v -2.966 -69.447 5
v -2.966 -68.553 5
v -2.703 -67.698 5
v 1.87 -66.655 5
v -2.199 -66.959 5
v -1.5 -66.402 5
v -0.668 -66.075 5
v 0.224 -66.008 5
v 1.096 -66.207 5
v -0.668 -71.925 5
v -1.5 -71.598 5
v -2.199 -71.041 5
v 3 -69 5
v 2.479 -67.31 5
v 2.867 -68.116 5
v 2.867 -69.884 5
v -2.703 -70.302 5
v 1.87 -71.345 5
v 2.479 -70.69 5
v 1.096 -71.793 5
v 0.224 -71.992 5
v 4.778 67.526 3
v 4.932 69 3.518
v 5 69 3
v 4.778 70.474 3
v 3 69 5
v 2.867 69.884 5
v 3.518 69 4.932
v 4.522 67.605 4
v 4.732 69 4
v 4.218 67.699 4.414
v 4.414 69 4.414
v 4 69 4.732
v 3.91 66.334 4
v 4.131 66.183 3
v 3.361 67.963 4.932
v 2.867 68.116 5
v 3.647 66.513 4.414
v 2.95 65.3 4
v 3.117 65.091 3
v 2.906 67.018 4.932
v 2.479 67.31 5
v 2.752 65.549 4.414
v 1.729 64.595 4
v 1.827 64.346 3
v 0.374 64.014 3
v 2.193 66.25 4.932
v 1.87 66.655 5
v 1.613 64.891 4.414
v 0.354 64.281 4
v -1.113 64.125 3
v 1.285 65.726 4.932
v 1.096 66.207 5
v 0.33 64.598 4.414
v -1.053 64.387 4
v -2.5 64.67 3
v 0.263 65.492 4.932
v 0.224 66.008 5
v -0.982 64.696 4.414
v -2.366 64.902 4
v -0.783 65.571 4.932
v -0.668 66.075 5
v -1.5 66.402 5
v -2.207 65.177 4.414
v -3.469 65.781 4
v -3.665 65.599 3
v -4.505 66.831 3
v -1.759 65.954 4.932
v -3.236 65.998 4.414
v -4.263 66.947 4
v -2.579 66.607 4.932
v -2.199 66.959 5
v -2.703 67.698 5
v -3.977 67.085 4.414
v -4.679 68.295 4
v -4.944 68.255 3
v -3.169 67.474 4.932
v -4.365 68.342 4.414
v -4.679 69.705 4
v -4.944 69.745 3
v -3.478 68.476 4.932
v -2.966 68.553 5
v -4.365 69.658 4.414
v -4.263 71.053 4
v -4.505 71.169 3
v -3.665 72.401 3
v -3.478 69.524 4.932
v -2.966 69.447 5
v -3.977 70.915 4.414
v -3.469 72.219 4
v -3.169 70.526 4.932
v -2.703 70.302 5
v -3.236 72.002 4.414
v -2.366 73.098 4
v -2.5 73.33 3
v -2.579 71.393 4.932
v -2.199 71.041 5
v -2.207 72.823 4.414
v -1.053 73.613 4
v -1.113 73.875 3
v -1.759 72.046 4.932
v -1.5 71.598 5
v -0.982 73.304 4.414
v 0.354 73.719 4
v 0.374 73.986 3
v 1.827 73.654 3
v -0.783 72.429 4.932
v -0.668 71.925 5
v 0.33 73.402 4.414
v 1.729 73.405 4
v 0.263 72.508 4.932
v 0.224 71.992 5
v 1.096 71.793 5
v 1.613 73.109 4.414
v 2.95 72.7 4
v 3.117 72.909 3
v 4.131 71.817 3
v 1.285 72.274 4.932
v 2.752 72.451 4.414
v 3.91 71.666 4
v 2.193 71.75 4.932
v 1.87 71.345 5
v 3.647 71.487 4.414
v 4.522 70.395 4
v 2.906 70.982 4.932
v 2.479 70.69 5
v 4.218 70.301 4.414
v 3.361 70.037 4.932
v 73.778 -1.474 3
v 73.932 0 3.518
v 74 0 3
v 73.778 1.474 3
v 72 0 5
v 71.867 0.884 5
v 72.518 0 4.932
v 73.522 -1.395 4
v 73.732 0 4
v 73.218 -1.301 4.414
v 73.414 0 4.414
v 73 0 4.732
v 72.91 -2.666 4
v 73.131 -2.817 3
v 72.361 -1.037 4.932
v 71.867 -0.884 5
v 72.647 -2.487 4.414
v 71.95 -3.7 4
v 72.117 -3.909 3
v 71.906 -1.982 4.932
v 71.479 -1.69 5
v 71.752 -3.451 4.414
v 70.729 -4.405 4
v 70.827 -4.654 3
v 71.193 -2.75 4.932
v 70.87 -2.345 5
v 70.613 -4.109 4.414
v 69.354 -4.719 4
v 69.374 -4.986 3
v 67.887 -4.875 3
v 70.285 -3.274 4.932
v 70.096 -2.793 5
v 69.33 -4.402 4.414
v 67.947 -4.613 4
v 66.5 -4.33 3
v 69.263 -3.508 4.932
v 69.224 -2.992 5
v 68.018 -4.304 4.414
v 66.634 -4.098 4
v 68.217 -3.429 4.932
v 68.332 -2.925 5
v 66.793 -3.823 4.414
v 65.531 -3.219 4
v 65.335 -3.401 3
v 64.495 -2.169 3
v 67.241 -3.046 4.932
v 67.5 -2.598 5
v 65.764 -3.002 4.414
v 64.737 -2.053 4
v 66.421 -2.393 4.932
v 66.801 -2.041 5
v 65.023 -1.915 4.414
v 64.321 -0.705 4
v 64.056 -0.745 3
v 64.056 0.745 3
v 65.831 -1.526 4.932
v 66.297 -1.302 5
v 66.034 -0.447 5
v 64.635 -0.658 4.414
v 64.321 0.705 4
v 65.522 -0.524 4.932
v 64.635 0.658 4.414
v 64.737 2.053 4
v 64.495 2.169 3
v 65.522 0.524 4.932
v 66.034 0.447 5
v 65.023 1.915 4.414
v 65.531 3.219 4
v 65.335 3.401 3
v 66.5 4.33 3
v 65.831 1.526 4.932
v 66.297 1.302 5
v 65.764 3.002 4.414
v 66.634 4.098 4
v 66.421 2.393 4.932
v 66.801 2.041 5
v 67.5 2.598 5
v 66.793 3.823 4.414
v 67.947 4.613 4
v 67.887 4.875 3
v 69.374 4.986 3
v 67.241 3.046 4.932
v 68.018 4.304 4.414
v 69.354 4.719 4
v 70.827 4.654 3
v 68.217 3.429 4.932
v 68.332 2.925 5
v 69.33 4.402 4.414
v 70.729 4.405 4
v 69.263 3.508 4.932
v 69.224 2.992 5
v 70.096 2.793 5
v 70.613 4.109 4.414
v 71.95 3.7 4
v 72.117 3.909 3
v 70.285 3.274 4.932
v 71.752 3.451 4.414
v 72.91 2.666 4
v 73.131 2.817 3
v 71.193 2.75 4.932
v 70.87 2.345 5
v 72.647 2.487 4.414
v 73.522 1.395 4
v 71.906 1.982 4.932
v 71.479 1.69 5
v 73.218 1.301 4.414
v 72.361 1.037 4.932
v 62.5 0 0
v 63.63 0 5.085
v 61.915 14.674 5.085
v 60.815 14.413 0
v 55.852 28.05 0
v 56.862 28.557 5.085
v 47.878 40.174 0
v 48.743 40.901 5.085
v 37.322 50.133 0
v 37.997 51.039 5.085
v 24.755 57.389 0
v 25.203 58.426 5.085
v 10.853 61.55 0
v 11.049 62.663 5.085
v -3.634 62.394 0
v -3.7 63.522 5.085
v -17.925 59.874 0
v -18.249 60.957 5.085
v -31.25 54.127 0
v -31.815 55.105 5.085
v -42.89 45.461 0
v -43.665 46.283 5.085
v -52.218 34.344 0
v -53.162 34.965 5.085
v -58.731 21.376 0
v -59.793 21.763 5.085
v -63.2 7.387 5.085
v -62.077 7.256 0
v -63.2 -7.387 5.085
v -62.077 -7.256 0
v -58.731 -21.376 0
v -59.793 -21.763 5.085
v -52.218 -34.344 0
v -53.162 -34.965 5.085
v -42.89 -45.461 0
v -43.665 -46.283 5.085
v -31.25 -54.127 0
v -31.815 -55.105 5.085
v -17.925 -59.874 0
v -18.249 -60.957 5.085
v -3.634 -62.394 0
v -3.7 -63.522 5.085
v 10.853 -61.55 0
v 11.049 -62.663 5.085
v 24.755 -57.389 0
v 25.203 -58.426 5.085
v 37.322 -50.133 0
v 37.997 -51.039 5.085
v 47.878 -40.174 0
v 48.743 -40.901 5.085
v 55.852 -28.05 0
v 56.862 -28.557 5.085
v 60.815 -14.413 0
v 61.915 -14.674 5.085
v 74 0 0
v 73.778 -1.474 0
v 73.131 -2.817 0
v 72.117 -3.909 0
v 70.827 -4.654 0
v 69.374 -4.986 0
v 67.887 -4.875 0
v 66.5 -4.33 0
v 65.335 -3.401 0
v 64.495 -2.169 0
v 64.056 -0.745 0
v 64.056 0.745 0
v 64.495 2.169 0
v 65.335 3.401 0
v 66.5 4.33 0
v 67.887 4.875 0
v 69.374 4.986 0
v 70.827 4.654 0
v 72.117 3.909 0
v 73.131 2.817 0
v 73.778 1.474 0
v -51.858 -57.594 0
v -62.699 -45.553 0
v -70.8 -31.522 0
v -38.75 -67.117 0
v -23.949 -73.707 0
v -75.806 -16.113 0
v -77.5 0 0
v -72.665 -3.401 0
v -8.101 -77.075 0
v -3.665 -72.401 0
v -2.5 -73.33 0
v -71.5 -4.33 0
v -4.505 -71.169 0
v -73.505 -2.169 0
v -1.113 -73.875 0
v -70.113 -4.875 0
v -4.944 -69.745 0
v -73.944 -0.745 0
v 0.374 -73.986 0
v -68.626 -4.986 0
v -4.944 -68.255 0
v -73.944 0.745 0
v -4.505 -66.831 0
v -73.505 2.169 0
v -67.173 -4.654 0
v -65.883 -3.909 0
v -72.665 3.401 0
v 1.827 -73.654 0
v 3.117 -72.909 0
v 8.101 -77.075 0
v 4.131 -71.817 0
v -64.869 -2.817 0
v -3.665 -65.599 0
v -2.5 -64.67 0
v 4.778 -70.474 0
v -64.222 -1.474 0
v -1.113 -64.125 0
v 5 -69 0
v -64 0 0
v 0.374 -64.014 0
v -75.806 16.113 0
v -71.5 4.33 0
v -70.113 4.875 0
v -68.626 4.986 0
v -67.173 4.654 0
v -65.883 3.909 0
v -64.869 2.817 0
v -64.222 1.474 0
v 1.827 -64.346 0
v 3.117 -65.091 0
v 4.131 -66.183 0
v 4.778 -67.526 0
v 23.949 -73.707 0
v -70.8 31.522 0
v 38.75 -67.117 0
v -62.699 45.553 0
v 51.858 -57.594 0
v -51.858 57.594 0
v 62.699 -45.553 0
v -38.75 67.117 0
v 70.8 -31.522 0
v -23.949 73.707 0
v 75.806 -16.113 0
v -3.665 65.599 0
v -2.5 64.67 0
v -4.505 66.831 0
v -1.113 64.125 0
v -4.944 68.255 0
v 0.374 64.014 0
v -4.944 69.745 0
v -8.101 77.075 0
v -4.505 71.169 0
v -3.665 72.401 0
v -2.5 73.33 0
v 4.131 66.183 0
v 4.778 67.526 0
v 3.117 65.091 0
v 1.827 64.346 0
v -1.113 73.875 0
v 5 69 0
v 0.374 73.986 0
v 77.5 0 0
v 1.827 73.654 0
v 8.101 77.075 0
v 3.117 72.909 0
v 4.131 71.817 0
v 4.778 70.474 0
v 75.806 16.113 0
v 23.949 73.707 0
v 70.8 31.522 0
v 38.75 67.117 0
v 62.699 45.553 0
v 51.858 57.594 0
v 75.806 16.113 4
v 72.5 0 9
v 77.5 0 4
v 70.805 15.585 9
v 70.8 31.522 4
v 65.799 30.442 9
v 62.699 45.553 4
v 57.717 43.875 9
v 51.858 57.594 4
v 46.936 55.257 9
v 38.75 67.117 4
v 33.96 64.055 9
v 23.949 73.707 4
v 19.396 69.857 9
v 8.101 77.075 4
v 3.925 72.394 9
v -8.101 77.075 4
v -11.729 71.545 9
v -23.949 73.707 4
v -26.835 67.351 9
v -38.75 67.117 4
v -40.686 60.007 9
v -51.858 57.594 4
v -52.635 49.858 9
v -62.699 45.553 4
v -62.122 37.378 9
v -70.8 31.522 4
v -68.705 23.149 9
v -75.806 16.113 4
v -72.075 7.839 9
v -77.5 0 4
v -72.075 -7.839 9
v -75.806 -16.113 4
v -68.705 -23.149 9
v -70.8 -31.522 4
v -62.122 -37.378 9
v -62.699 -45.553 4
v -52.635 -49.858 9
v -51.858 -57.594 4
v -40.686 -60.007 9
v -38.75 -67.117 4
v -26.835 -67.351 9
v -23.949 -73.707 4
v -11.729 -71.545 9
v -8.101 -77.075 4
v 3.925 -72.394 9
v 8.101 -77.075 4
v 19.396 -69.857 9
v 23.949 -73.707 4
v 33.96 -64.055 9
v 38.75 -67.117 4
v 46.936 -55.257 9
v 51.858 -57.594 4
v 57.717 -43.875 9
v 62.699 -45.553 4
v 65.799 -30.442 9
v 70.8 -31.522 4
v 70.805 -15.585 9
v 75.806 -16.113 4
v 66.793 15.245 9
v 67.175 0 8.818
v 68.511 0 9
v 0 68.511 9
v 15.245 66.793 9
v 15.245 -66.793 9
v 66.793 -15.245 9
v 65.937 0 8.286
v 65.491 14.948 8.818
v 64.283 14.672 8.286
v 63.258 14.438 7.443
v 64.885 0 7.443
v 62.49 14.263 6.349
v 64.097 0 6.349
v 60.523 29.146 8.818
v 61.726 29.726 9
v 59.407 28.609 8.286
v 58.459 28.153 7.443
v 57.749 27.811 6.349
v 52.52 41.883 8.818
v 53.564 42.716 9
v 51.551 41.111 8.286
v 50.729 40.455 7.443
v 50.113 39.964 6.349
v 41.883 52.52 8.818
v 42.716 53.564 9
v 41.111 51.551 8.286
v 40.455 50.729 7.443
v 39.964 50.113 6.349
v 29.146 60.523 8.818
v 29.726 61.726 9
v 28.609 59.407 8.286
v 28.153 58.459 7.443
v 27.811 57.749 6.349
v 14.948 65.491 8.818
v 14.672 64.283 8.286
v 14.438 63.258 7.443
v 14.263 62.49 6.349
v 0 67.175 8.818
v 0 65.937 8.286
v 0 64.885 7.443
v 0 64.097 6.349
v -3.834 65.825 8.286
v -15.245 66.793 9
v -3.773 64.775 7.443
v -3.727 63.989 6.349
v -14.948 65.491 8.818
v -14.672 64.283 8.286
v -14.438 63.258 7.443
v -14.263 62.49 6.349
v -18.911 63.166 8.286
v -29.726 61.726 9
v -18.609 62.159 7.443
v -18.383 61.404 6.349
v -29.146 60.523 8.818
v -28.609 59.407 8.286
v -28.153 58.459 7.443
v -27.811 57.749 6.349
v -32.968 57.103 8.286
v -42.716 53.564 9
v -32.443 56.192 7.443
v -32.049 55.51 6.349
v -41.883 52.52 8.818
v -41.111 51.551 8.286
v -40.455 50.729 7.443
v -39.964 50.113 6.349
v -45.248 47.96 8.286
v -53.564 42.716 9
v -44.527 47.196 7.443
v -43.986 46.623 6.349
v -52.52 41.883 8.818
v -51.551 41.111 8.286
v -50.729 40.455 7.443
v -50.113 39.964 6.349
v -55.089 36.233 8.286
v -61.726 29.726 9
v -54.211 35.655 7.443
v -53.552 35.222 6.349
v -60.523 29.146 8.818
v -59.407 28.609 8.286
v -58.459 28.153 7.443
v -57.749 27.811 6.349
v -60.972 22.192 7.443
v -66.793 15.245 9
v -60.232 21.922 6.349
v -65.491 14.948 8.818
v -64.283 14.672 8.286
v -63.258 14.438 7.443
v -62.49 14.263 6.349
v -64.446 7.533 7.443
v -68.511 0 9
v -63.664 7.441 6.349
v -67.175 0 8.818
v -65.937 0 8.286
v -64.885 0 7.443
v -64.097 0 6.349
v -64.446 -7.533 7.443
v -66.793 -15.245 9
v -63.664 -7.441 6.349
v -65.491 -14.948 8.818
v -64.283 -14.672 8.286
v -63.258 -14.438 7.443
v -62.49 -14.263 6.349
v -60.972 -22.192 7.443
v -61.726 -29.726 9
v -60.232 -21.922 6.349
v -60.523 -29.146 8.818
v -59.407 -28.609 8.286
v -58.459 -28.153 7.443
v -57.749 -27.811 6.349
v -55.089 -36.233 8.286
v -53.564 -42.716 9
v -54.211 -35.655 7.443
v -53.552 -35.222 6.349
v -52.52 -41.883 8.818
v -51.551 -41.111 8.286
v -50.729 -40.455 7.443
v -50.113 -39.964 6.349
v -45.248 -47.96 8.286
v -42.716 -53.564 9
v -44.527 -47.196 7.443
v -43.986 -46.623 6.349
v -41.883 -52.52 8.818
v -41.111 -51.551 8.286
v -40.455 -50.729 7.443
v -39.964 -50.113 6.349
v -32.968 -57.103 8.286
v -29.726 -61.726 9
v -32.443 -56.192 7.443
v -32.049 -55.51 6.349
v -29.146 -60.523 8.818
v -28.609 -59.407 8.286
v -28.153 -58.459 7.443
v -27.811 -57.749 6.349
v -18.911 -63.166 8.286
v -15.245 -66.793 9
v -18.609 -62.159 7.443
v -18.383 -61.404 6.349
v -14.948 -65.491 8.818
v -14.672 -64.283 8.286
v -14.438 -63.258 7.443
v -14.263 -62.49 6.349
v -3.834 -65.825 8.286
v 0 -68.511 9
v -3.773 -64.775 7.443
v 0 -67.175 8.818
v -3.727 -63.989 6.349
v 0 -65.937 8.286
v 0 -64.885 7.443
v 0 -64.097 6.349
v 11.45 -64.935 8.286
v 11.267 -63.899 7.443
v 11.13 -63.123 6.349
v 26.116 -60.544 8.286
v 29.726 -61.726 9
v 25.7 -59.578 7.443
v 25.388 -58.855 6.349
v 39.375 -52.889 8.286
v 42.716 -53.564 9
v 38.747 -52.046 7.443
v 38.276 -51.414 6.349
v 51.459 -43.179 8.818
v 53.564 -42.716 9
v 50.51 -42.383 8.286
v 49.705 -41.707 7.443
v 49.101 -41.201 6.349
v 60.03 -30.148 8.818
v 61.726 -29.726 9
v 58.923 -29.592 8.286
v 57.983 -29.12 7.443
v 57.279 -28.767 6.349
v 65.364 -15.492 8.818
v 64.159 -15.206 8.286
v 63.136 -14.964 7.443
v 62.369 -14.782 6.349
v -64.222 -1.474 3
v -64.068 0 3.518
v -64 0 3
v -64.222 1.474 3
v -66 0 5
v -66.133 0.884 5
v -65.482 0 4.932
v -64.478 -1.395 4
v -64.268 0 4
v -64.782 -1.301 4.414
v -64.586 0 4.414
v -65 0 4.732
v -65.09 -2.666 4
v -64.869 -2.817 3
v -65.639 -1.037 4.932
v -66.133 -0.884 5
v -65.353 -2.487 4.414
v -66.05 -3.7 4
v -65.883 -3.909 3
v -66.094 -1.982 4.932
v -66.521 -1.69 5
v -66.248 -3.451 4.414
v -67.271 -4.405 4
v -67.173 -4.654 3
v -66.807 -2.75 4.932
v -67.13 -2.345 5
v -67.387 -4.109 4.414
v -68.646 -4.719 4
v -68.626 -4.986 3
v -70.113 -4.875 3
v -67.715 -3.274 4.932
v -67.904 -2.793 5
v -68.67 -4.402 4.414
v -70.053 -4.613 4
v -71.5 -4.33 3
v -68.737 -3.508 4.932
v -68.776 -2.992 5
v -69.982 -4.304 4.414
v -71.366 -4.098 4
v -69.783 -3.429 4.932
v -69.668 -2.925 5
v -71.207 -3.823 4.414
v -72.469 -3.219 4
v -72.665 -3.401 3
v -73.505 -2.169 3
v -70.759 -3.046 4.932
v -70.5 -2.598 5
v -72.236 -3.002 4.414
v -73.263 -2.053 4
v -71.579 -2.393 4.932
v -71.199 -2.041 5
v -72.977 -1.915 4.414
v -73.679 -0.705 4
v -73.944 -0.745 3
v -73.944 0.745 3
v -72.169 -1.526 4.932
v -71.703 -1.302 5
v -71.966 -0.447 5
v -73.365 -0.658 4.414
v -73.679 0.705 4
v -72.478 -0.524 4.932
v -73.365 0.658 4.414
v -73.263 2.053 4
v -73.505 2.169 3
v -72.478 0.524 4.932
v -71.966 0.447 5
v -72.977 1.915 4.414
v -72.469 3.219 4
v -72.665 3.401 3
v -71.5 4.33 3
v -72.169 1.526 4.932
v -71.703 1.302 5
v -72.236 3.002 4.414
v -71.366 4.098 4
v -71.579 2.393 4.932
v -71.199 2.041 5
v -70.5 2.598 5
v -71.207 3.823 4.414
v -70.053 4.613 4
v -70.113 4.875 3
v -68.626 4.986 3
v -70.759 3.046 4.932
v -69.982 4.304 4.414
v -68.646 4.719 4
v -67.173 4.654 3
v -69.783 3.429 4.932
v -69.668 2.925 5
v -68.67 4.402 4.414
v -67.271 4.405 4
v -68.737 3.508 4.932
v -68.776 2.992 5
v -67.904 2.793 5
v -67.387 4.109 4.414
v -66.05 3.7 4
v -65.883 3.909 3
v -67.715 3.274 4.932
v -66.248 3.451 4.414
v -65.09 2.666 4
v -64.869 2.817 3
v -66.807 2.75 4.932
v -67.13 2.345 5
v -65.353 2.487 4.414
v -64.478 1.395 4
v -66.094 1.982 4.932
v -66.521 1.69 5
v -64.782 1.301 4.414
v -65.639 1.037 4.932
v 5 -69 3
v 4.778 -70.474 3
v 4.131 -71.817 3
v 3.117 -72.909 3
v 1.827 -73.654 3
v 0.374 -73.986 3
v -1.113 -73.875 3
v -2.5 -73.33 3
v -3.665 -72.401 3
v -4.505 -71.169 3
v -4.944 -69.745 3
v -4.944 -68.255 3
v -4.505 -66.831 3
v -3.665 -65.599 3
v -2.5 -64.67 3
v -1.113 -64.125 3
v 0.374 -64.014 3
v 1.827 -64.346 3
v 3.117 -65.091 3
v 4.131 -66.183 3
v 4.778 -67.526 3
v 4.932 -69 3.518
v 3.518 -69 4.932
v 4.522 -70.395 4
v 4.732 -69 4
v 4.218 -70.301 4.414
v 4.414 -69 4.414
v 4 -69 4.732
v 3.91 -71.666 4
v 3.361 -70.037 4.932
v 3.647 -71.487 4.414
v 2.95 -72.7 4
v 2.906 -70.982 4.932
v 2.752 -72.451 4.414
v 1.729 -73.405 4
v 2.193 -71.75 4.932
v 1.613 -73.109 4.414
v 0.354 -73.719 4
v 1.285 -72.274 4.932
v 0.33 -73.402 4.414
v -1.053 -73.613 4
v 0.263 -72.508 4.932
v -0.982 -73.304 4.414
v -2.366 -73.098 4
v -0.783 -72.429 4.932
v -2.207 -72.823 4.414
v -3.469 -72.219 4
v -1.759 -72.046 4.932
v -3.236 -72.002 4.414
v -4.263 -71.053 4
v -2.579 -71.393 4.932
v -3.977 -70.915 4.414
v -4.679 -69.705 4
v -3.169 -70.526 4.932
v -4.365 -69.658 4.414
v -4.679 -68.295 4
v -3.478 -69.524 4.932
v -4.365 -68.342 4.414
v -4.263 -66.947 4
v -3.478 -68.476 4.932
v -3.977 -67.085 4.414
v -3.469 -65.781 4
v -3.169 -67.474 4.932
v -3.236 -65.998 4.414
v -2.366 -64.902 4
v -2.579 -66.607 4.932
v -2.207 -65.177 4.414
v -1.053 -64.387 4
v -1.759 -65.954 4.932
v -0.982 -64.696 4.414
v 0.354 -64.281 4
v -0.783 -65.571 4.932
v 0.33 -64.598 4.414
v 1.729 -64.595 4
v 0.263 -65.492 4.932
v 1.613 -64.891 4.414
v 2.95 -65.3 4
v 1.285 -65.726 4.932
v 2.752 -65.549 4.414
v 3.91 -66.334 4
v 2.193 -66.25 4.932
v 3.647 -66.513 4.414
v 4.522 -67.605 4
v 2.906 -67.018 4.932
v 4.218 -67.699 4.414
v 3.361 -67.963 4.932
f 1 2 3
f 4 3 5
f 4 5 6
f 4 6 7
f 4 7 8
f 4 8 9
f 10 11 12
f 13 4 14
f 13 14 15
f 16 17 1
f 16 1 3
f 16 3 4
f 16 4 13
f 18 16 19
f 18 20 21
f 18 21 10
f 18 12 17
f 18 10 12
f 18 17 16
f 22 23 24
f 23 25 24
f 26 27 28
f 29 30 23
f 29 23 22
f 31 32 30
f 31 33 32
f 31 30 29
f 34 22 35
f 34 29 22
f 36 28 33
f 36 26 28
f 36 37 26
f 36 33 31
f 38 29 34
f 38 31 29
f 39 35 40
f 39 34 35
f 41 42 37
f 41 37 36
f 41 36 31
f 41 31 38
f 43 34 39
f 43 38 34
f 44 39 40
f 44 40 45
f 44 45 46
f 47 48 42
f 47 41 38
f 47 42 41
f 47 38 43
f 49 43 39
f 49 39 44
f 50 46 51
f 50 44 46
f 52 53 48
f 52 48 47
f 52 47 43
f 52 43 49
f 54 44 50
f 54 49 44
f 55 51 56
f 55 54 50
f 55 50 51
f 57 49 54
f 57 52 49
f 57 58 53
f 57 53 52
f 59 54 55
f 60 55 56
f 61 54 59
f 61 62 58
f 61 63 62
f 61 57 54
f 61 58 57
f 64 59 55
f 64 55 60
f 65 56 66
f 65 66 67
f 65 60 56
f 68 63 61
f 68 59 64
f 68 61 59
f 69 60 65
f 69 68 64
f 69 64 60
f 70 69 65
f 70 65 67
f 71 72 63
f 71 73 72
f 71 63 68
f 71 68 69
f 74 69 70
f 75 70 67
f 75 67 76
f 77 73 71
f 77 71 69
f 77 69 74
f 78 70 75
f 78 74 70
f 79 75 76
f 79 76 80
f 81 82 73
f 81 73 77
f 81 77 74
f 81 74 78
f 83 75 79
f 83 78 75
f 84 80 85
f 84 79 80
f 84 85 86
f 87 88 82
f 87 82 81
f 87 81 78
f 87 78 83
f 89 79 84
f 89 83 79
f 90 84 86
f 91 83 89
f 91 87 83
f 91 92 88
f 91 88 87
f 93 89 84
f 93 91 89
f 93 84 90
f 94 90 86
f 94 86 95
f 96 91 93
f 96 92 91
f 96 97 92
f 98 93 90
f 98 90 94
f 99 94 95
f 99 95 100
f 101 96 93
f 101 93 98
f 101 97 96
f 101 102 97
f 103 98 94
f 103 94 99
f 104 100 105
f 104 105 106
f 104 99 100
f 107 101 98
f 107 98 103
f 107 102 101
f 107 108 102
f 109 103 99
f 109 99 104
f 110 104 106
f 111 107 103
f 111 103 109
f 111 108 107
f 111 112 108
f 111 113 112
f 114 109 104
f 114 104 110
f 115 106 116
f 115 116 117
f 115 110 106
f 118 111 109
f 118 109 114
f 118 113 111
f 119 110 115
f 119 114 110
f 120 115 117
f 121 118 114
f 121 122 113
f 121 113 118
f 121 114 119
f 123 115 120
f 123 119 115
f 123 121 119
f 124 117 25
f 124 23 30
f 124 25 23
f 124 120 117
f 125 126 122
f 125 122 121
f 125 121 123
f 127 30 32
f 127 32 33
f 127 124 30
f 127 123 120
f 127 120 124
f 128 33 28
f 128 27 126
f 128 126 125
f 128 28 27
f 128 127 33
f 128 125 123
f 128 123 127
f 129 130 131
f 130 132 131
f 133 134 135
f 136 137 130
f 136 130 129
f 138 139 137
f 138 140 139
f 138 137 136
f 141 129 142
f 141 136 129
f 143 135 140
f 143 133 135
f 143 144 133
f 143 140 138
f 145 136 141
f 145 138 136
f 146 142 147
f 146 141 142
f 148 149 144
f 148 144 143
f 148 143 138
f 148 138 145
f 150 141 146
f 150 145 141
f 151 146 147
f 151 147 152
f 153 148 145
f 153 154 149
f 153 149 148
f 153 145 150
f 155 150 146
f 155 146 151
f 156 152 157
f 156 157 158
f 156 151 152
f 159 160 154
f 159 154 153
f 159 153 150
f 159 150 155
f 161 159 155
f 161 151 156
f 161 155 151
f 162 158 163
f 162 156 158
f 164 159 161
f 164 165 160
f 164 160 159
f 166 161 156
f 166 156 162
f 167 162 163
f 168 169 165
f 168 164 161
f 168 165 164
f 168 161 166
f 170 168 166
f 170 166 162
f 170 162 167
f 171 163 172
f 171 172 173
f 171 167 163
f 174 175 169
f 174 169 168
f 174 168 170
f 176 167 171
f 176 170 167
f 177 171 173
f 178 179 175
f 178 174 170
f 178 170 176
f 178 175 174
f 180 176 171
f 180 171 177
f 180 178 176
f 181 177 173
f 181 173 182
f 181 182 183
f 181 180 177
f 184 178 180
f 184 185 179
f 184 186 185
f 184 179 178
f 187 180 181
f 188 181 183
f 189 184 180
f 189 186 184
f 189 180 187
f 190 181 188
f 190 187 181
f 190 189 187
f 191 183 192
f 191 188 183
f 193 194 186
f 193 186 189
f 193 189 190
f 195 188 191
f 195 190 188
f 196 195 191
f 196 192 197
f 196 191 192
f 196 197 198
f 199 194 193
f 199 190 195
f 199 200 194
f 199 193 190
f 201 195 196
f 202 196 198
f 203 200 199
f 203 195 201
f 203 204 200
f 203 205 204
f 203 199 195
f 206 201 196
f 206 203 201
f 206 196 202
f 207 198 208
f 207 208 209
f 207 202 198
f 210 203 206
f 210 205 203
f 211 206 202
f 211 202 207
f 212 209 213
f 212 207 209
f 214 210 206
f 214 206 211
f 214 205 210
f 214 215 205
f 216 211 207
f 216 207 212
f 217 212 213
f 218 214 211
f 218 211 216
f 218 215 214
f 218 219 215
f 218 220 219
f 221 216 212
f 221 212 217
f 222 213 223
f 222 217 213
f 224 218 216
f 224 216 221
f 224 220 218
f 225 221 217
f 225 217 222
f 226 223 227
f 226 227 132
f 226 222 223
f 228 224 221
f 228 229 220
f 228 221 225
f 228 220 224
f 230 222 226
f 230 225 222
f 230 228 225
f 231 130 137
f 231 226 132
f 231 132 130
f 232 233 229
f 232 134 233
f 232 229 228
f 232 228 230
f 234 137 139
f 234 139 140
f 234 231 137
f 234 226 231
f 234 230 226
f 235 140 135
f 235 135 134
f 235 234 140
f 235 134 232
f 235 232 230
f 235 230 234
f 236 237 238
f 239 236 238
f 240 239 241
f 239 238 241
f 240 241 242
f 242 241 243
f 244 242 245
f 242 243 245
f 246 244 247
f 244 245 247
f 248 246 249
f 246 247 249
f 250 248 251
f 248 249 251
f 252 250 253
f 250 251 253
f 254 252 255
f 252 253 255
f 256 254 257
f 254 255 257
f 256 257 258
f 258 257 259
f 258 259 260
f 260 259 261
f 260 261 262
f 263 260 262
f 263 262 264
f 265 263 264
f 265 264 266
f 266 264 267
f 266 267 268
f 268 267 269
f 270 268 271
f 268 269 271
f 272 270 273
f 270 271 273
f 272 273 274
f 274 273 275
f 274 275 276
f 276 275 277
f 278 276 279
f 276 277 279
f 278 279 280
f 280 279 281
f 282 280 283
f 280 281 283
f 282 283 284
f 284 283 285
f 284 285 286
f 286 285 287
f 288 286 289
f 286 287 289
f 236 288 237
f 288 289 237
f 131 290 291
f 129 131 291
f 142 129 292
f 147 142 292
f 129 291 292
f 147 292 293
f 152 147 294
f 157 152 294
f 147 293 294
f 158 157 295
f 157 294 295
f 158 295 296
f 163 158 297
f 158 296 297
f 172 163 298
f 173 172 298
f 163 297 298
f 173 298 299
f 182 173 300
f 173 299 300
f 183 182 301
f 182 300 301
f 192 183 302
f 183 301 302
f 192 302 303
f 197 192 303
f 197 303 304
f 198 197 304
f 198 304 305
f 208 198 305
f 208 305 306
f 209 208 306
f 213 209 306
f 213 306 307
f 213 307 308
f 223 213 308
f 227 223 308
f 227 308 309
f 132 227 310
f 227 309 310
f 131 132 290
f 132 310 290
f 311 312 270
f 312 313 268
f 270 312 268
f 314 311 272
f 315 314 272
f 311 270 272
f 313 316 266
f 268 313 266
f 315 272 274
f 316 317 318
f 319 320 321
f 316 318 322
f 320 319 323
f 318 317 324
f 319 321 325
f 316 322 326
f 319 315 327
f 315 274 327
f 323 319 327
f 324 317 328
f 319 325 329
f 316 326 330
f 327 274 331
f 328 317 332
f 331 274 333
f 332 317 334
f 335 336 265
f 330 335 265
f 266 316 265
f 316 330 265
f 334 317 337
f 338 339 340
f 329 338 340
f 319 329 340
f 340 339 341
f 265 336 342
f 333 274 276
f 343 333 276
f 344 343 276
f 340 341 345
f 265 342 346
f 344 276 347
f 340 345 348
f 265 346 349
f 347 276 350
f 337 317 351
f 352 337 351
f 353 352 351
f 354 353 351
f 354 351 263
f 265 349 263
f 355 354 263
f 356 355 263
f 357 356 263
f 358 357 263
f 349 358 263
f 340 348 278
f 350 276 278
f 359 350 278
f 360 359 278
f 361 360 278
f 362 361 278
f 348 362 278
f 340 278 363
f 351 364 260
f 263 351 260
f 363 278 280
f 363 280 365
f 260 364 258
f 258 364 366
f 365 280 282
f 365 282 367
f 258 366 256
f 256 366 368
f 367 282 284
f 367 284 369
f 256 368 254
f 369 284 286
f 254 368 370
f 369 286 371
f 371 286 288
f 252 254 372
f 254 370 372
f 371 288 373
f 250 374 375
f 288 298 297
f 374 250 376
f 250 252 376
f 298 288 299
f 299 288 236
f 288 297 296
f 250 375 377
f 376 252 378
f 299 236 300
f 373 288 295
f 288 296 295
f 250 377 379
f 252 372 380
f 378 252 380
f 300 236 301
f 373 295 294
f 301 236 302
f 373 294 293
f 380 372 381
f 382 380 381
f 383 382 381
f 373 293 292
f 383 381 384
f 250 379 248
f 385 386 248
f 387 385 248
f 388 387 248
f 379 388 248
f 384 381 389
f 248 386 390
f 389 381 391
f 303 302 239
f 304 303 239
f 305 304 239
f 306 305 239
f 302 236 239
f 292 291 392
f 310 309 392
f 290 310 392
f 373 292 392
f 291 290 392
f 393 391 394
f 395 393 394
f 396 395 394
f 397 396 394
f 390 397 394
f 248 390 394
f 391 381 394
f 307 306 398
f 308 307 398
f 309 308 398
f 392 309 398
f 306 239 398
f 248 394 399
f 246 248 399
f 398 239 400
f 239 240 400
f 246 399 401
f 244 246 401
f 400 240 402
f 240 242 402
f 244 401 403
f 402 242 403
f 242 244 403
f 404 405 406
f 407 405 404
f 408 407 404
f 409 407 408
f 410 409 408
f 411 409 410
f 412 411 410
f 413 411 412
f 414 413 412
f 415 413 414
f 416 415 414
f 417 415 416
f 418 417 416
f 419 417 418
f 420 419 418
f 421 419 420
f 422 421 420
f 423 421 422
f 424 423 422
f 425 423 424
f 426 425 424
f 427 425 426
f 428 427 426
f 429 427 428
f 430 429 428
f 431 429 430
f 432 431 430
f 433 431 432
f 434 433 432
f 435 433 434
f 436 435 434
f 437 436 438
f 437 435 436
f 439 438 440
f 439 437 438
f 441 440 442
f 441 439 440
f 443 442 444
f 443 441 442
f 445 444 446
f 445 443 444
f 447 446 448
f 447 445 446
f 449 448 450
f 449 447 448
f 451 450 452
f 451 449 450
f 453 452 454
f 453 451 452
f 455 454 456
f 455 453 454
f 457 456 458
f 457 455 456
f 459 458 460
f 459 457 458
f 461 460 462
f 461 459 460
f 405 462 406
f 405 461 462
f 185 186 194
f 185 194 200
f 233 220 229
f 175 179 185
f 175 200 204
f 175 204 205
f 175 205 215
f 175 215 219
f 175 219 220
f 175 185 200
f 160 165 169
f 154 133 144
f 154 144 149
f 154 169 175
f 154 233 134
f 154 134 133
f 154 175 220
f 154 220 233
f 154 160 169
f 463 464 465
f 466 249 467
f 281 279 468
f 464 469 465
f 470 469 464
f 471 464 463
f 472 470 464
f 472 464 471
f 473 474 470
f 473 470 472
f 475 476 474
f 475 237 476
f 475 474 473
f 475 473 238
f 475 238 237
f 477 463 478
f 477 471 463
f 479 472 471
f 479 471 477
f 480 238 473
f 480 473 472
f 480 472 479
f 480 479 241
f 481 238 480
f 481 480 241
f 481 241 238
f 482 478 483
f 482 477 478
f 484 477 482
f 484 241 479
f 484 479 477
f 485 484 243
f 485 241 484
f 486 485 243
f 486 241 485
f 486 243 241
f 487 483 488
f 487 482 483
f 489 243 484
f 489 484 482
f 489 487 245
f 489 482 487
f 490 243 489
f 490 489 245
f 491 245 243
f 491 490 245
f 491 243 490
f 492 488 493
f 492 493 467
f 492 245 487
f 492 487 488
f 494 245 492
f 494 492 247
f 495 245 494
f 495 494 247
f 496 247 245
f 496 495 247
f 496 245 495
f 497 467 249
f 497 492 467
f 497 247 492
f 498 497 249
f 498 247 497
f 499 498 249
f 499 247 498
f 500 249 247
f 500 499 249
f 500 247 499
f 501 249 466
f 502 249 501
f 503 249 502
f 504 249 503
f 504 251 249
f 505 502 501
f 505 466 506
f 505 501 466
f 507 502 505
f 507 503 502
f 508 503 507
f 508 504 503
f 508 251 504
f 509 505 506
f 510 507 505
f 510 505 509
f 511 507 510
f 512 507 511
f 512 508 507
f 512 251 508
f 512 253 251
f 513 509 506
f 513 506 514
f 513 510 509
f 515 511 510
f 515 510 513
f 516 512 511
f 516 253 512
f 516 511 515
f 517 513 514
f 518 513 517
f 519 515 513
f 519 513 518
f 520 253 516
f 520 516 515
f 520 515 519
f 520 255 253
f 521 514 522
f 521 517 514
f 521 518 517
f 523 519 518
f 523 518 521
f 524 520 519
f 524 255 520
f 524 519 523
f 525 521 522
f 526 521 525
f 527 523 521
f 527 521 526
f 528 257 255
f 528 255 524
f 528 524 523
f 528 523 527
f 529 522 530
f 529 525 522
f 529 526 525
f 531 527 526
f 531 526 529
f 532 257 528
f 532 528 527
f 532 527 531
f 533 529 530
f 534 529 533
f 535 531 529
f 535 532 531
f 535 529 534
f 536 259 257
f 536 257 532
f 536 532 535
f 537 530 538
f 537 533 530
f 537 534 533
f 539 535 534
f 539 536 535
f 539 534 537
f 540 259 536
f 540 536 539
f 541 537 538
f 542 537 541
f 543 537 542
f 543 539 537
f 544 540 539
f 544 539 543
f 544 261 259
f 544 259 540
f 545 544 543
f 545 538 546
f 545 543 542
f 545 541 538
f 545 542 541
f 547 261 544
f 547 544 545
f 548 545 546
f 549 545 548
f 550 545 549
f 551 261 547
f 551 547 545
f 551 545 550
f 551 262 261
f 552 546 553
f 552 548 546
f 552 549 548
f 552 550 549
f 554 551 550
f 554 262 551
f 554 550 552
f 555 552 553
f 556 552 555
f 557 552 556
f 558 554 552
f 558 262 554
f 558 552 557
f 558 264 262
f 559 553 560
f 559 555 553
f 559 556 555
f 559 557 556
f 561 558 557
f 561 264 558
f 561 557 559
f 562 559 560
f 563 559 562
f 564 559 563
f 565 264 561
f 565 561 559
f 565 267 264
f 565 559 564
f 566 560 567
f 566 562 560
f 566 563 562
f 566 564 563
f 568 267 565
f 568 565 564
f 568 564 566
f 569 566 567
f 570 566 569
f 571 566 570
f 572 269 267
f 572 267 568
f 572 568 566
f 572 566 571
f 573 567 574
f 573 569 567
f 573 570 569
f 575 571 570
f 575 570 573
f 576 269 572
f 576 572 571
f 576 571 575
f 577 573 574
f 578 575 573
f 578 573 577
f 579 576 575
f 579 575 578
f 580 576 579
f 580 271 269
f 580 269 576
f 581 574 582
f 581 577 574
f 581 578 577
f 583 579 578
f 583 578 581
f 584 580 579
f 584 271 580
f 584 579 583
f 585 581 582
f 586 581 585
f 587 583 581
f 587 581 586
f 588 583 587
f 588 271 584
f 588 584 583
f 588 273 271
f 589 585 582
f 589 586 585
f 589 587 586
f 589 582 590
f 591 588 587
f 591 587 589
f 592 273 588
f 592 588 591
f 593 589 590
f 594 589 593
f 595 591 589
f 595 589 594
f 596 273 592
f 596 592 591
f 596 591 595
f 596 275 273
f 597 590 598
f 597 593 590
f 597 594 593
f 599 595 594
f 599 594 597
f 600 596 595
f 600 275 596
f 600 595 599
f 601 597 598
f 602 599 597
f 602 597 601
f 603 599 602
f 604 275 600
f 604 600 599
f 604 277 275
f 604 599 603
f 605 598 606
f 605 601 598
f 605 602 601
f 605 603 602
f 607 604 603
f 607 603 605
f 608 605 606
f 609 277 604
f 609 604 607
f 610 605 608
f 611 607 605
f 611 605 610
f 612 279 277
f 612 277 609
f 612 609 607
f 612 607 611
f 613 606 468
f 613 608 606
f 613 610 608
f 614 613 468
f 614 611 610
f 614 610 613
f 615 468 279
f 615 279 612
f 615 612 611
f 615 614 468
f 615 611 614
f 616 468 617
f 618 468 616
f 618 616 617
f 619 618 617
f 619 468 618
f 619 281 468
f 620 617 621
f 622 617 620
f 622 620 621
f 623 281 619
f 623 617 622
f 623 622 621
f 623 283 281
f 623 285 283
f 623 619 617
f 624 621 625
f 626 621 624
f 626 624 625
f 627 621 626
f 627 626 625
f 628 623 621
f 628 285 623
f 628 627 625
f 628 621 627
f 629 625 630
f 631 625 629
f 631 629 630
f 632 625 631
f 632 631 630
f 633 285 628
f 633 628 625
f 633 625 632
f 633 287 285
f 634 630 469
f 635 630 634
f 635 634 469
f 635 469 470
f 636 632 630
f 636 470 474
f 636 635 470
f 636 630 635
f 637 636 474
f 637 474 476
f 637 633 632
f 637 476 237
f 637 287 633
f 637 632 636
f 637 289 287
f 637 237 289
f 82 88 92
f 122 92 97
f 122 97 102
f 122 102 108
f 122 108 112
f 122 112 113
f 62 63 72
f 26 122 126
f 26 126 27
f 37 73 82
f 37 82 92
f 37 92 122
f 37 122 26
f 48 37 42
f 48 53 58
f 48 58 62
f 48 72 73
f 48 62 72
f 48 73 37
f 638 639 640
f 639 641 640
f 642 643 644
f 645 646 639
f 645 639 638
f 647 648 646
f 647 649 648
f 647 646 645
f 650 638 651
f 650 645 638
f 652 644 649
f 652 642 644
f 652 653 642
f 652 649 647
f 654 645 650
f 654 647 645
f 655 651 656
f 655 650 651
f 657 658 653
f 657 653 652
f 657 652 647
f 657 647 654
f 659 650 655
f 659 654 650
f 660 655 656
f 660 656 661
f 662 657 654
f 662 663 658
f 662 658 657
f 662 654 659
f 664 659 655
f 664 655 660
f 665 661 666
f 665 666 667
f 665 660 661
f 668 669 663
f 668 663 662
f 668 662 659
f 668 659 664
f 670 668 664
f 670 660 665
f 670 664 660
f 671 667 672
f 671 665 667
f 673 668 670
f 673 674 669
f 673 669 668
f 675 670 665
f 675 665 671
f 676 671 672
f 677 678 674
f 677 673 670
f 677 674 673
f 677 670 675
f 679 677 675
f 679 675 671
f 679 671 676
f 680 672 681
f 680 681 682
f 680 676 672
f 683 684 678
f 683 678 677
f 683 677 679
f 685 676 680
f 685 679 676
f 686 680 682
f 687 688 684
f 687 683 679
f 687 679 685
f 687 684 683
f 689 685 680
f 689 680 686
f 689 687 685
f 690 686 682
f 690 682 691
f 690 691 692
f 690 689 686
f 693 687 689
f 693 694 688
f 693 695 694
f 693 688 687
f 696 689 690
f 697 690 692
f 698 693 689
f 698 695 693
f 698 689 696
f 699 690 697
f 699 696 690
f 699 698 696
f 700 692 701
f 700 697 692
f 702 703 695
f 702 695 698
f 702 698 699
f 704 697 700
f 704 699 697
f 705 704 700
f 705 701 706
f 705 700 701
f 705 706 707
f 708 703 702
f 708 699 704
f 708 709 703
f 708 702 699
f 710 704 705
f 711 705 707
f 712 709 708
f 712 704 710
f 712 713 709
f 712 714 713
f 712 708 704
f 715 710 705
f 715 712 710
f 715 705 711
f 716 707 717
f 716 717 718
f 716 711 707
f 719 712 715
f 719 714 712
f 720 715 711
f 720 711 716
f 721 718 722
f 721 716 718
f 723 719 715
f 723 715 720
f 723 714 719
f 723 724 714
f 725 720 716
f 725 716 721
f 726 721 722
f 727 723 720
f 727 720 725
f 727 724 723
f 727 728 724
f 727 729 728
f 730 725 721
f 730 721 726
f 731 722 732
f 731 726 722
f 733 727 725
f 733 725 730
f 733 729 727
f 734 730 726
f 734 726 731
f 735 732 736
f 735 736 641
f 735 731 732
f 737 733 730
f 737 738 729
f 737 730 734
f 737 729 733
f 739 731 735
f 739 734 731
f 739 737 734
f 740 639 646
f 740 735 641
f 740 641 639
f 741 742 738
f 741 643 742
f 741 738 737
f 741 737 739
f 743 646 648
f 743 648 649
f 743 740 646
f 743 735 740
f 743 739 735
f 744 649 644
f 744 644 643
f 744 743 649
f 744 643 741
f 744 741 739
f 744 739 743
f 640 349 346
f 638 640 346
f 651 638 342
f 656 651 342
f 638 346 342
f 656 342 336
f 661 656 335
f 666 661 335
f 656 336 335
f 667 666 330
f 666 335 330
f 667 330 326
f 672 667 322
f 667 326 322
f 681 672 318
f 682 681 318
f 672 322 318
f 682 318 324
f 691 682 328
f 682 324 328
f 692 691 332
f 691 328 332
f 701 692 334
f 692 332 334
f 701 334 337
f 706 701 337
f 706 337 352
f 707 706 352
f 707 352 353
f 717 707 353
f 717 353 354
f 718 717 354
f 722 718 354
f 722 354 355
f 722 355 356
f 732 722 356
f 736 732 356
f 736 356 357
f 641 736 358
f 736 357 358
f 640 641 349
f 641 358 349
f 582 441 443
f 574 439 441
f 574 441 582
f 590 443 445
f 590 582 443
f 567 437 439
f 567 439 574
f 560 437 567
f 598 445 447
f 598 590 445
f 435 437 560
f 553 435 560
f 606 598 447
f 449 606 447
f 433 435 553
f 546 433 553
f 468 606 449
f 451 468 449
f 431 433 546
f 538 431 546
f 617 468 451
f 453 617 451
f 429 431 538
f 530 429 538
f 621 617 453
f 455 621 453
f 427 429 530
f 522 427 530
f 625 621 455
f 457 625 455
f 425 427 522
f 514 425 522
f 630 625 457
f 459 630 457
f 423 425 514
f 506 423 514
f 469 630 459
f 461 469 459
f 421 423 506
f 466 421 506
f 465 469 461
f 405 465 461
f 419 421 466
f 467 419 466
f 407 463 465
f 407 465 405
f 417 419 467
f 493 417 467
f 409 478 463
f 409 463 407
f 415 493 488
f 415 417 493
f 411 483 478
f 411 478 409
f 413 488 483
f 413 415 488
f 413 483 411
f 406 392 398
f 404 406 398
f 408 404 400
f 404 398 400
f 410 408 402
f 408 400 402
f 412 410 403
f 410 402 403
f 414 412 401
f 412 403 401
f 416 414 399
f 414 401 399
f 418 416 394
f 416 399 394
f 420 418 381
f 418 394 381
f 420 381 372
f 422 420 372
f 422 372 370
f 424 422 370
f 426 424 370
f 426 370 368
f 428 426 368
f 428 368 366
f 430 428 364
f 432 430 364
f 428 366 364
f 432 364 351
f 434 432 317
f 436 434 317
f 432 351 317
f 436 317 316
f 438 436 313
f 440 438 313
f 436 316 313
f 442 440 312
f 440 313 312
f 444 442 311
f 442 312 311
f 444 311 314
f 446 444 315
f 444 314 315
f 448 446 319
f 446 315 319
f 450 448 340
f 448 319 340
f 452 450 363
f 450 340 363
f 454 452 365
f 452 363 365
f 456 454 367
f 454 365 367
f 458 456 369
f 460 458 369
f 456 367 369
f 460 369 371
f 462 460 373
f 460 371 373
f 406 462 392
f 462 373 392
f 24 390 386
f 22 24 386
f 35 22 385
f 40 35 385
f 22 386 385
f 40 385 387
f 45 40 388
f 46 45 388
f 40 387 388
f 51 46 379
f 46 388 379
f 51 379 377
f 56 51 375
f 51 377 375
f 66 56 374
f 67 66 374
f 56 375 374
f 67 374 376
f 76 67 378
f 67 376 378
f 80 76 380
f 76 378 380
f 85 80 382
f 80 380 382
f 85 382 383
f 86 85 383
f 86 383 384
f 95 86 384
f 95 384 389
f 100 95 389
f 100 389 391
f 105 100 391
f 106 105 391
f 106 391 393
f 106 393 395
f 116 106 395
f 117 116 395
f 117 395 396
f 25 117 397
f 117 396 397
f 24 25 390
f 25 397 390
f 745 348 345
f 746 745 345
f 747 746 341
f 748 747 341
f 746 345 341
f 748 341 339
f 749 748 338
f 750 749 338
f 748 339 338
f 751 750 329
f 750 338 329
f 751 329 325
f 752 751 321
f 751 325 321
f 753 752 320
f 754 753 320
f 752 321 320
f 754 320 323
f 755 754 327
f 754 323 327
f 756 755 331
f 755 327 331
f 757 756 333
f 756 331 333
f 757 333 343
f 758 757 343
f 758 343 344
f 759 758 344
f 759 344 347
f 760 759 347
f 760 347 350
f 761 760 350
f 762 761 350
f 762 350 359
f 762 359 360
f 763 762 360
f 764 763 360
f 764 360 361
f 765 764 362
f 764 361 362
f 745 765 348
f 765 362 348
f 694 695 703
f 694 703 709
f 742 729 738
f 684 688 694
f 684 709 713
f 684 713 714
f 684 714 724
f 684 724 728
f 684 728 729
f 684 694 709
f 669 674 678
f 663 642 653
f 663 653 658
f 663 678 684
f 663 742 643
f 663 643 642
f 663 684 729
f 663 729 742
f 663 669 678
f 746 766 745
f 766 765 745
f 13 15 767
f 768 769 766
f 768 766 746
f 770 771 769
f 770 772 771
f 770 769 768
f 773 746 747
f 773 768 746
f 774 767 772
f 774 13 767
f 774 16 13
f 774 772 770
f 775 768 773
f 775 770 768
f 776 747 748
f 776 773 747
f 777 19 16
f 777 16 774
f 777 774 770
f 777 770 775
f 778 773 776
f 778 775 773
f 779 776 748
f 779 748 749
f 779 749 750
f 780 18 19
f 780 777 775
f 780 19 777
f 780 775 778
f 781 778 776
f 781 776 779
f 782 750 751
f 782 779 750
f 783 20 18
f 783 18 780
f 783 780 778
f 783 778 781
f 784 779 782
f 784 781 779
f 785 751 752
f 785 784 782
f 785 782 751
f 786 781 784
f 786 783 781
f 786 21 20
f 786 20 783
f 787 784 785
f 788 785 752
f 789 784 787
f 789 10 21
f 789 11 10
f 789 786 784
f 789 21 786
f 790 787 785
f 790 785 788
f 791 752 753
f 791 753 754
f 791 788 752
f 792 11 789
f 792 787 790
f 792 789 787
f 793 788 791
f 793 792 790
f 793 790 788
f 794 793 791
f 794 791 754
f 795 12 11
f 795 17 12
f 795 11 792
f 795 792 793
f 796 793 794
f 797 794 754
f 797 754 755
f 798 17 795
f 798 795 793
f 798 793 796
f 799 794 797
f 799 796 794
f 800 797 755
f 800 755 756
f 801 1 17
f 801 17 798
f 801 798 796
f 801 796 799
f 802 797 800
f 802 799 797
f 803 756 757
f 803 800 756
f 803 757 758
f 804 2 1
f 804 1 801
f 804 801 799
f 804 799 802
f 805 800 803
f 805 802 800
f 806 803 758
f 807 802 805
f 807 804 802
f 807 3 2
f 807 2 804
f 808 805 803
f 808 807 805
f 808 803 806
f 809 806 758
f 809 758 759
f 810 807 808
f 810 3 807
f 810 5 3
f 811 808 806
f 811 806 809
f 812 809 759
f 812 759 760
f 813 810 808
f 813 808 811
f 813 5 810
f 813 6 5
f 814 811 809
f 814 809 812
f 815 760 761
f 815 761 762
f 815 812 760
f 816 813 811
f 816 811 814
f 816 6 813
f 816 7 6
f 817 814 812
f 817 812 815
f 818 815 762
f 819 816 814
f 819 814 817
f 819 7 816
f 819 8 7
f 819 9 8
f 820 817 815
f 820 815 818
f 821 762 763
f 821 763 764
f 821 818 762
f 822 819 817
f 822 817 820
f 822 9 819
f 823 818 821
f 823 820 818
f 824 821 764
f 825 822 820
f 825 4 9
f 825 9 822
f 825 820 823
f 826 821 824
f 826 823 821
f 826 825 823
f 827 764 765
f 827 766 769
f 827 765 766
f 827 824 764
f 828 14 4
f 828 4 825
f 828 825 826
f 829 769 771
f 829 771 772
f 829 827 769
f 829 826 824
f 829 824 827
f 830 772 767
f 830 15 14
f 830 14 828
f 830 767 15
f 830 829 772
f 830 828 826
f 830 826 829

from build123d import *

# Parameters (mm, degrees)
F0_R     = 77.5
F0_R_2   = 62.5
F1_DEPTH = 9
F2_SIZE  = 5
F3_SIZE2 = 1.99999
F3_SIZE  = 8.99999
F4_R     = 5
F5_R     = 5
F6_DEPTH = 5
F7_R     = 2


# Not quite as in the source:
# - a fillet or chamfer is up to 0.001 mm smaller than in the source, because OpenCascade refuses the exact size


with BuildPart() as f1:
    # F0 (on Top) → F1 (new body)
    with BuildSketch(Plane.XY):
        Circle(F0_R)
        Circle(F0_R_2, mode=Mode.SUBTRACT)
    extrude(amount=F1_DEPTH)

    # F2
    f2_edges = [f1.edges().sort_by_distance(p)[0] for p in [
        (-77.5, 0, 9),
    ]]
    chamfer(f2_edges, length=F2_SIZE)

    # F3 (size 9 and 2 in the source; OpenCascade refuses exactly that, so slightly less here)
    f3_edges = [f1.edges().sort_by_distance(p)[0] for p in [
        (-62.5, 0, 9),
    ]]
    f3_side = f1.faces().sort_by_distance((-62.5, 0, 4.5))[0]
    chamfer(f3_edges, length=F3_SIZE, length2=F3_SIZE2, reference=f3_side)

    # F4
    f4_edges = [f1.edges().sort_by_distance(p)[0] for p in [
        (-64.49999, 0, 9),
    ]]
    fillet(f4_edges, radius=F4_R)

    # F5 (on face) → F6 (cut)
    with BuildSketch(Plane(origin=(0, 0, 0), x_dir=(1, 0, 0), z_dir=(0, 0, -1))):
        with Locations((0, 69)):
            Circle(F5_R)
        with Locations((-69, 0)):
            Circle(F5_R)
        with Locations((0, -69)):
            Circle(F5_R)
        with Locations((69, 0)):
            Circle(F5_R)
    extrude(amount=-F6_DEPTH, mode=Mode.SUBTRACT)

    # F7
    f7_edges = [f1.edges().sort_by_distance(p)[0] for p in [
        (-5, -69, 5),
        (-74, 0, 5),
        (64, 0, 5),
        (-5, 69, 5),
    ]]
    fillet(f7_edges, radius=F7_R)


solid = f1.part
